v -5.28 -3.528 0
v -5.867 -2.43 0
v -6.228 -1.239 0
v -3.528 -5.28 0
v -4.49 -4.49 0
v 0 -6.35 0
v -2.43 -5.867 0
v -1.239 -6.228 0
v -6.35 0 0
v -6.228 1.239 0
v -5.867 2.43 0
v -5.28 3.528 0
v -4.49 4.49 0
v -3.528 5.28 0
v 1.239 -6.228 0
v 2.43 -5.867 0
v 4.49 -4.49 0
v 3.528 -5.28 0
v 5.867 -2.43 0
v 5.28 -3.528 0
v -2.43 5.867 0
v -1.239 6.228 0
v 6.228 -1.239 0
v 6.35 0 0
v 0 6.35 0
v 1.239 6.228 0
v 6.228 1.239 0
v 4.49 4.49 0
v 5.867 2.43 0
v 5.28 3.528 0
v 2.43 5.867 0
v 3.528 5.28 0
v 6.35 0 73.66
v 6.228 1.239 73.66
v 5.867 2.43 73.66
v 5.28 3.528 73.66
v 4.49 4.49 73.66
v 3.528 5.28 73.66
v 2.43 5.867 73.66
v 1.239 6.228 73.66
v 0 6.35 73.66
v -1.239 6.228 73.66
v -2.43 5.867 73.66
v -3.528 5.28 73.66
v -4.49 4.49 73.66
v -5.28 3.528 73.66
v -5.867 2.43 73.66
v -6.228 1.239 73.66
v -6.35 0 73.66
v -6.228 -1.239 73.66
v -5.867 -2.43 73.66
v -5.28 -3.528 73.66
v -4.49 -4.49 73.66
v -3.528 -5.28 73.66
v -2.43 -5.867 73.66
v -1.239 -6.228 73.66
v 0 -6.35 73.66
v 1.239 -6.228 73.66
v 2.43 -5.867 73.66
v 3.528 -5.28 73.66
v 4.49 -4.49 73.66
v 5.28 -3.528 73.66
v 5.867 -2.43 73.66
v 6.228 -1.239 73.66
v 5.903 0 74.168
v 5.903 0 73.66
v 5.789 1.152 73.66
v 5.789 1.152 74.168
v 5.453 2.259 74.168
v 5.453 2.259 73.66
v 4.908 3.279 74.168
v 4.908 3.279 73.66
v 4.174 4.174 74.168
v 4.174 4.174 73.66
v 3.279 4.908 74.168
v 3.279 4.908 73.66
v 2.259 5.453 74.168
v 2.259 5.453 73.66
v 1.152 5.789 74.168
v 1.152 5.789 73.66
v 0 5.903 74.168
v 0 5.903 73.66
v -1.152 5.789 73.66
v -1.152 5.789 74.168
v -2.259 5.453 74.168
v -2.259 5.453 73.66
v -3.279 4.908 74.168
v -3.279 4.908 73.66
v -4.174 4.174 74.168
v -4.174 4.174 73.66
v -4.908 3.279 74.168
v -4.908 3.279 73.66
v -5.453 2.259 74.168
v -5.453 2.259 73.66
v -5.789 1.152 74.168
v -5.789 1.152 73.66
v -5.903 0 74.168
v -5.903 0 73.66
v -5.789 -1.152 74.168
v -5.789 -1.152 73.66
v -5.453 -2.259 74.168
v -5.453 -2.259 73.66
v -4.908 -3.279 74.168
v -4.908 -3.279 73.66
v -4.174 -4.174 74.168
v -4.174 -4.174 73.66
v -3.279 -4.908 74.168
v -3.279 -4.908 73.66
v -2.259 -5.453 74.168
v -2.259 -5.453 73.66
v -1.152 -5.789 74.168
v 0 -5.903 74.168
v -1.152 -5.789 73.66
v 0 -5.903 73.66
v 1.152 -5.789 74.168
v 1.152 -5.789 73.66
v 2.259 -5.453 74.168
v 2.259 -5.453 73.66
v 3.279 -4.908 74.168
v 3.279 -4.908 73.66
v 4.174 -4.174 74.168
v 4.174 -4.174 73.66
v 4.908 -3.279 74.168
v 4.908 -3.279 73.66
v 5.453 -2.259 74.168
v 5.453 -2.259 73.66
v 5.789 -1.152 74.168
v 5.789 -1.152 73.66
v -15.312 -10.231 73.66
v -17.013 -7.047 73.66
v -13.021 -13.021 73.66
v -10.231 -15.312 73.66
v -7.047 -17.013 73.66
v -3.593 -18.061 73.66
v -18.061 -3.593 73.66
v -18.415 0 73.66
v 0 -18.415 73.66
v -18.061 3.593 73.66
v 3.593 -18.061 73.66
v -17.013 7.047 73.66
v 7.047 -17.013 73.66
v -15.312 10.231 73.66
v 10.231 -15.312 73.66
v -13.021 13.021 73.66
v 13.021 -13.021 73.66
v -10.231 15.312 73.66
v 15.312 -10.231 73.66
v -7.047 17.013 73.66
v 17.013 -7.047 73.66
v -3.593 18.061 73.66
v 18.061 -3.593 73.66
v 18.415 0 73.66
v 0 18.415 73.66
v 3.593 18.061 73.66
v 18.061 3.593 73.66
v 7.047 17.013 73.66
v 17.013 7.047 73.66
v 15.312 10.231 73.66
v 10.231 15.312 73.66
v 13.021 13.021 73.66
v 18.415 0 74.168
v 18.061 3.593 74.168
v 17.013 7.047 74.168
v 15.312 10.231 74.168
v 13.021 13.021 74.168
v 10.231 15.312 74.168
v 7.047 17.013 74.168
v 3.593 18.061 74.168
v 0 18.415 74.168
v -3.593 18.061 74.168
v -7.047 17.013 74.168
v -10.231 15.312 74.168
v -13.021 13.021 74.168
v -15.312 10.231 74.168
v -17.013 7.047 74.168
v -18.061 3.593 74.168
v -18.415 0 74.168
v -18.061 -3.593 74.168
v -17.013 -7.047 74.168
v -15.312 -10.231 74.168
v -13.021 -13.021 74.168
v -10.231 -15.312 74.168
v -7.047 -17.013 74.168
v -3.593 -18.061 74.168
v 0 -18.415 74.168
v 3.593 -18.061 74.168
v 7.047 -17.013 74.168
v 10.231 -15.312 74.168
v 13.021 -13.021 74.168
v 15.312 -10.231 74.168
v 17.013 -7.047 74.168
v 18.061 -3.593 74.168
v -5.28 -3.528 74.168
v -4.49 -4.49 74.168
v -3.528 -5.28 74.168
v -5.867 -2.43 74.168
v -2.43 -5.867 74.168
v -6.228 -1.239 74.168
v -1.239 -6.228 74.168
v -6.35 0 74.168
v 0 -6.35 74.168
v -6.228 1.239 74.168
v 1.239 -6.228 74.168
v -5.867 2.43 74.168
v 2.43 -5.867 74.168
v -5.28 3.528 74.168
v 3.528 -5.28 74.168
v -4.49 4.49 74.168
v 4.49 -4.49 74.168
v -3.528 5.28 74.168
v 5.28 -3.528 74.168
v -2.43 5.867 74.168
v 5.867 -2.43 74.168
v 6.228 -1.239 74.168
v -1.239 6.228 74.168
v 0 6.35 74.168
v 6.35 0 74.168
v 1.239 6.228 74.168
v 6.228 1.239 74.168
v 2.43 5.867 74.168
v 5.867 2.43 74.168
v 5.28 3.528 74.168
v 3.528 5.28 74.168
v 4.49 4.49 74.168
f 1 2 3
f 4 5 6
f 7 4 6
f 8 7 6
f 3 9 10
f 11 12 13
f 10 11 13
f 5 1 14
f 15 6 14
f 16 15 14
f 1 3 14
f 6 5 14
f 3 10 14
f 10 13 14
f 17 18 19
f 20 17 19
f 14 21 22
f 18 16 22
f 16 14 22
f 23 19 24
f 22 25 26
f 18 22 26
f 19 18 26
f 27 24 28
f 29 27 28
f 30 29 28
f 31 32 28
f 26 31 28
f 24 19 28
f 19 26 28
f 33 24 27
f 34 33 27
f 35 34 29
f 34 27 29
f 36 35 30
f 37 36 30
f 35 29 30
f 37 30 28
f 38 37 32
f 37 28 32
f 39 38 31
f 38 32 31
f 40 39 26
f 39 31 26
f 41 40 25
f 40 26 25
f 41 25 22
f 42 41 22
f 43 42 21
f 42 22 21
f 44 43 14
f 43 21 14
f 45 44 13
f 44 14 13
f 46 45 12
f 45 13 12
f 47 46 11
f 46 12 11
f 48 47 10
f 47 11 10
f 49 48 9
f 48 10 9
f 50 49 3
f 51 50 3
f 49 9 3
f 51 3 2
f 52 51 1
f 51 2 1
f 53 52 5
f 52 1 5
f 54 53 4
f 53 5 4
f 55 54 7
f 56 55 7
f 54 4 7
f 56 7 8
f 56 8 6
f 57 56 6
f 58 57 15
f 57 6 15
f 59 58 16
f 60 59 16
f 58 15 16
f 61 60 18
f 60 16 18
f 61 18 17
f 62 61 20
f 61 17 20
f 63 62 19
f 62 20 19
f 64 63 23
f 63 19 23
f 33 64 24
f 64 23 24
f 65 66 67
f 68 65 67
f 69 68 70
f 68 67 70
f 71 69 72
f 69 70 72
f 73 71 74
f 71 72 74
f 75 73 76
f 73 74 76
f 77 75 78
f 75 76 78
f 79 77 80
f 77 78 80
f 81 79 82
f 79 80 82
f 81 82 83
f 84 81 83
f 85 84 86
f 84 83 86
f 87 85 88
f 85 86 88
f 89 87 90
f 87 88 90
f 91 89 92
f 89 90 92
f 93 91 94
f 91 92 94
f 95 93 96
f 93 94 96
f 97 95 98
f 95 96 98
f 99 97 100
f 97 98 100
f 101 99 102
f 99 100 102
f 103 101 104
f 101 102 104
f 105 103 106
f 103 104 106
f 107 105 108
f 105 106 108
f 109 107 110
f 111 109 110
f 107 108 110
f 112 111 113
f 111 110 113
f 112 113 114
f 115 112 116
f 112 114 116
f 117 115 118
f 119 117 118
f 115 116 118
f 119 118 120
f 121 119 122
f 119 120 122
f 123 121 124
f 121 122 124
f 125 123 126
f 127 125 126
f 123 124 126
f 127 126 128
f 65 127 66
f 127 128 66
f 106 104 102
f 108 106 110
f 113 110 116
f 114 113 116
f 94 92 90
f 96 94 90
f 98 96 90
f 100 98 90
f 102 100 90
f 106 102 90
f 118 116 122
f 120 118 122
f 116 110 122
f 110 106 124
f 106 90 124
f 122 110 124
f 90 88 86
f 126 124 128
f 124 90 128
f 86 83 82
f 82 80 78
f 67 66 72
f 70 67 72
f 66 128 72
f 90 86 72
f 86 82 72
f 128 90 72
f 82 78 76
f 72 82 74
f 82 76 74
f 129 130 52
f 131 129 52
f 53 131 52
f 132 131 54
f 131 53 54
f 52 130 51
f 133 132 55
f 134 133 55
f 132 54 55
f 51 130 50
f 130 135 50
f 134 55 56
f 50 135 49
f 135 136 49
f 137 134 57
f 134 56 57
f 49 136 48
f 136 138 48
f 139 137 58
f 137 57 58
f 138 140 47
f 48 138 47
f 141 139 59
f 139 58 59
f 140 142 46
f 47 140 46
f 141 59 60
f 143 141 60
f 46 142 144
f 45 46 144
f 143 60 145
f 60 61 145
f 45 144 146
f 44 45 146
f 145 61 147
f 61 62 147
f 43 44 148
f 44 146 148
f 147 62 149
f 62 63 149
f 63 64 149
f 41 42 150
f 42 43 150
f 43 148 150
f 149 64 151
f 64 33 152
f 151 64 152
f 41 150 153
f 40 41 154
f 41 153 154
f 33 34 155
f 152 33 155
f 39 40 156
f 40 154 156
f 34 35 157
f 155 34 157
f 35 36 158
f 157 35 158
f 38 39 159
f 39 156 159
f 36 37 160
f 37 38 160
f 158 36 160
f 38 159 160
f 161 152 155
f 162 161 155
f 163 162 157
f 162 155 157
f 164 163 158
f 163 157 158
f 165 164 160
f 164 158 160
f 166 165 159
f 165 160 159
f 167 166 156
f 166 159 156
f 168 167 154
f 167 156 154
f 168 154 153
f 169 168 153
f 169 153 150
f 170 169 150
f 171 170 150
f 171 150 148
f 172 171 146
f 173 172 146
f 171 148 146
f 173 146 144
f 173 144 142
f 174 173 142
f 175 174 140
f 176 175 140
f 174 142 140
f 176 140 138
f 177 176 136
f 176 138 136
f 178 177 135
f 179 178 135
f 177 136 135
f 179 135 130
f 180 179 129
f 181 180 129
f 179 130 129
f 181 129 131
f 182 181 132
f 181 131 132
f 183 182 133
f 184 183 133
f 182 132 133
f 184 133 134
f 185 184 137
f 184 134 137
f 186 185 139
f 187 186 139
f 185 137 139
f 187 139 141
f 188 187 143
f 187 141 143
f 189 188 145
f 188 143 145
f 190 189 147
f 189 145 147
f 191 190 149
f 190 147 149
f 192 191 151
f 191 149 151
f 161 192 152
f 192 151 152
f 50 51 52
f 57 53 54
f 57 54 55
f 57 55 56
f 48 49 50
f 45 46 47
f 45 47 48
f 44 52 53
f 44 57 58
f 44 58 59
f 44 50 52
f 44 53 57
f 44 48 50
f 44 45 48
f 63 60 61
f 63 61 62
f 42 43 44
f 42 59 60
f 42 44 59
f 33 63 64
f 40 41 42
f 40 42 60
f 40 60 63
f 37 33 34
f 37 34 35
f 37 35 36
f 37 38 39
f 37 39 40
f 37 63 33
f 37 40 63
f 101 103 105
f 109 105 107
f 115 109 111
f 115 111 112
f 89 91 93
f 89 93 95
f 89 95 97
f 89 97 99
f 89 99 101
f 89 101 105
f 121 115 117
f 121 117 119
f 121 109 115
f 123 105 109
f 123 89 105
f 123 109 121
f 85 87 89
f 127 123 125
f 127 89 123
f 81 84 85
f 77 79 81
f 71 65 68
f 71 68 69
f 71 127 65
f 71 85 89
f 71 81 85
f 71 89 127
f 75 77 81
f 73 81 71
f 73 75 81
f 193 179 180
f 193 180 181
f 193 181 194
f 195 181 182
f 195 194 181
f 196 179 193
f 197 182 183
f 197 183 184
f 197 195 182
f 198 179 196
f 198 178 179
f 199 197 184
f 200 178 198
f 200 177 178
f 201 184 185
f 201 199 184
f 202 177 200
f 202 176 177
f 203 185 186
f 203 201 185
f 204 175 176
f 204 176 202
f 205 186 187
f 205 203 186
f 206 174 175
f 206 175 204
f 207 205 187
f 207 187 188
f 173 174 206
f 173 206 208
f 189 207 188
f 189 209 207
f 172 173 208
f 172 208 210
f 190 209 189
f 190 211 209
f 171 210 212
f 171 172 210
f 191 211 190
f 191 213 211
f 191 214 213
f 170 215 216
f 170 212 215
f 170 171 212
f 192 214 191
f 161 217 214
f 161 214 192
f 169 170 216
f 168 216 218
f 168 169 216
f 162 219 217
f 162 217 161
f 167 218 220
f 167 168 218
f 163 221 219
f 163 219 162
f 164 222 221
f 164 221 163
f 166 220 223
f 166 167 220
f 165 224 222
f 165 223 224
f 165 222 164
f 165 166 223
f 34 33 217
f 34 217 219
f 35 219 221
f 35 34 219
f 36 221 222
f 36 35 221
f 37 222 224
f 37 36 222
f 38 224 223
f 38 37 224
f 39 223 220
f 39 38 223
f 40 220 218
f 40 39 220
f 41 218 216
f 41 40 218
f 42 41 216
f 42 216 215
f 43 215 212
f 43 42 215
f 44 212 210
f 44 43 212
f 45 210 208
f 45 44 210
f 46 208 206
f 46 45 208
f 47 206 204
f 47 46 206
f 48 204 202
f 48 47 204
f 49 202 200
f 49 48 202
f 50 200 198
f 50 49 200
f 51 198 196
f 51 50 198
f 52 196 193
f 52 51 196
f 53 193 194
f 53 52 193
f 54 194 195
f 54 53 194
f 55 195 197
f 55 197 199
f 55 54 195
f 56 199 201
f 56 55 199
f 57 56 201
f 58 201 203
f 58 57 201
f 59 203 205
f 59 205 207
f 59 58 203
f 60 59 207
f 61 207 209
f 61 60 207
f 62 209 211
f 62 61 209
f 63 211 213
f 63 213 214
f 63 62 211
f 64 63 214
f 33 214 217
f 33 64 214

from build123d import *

# Parameters (mm, degrees)
F0_R     = 6.35
F1_DEPTH = 73.66
F2_R     = 18.415
F2_R_2   = 6.35
F2_R_3   = 5.902703
F3_DEPTH = 0.508


with BuildPart() as f1:
    # F0 (on Top) → F1 (new body)
    with BuildSketch(Plane.XY):
        Circle(F0_R)
    extrude(amount=F1_DEPTH)


with BuildPart() as f3:
    # F2 (on face) → F3 (new body)
    with BuildSketch(Plane.XY.offset(73.66)):
        Circle(F2_R)
        Circle(F2_R_2, mode=Mode.SUBTRACT)
        Circle(F2_R_3)
    extrude(amount=F3_DEPTH)


solid = Compound([f1.part, f3.part])
